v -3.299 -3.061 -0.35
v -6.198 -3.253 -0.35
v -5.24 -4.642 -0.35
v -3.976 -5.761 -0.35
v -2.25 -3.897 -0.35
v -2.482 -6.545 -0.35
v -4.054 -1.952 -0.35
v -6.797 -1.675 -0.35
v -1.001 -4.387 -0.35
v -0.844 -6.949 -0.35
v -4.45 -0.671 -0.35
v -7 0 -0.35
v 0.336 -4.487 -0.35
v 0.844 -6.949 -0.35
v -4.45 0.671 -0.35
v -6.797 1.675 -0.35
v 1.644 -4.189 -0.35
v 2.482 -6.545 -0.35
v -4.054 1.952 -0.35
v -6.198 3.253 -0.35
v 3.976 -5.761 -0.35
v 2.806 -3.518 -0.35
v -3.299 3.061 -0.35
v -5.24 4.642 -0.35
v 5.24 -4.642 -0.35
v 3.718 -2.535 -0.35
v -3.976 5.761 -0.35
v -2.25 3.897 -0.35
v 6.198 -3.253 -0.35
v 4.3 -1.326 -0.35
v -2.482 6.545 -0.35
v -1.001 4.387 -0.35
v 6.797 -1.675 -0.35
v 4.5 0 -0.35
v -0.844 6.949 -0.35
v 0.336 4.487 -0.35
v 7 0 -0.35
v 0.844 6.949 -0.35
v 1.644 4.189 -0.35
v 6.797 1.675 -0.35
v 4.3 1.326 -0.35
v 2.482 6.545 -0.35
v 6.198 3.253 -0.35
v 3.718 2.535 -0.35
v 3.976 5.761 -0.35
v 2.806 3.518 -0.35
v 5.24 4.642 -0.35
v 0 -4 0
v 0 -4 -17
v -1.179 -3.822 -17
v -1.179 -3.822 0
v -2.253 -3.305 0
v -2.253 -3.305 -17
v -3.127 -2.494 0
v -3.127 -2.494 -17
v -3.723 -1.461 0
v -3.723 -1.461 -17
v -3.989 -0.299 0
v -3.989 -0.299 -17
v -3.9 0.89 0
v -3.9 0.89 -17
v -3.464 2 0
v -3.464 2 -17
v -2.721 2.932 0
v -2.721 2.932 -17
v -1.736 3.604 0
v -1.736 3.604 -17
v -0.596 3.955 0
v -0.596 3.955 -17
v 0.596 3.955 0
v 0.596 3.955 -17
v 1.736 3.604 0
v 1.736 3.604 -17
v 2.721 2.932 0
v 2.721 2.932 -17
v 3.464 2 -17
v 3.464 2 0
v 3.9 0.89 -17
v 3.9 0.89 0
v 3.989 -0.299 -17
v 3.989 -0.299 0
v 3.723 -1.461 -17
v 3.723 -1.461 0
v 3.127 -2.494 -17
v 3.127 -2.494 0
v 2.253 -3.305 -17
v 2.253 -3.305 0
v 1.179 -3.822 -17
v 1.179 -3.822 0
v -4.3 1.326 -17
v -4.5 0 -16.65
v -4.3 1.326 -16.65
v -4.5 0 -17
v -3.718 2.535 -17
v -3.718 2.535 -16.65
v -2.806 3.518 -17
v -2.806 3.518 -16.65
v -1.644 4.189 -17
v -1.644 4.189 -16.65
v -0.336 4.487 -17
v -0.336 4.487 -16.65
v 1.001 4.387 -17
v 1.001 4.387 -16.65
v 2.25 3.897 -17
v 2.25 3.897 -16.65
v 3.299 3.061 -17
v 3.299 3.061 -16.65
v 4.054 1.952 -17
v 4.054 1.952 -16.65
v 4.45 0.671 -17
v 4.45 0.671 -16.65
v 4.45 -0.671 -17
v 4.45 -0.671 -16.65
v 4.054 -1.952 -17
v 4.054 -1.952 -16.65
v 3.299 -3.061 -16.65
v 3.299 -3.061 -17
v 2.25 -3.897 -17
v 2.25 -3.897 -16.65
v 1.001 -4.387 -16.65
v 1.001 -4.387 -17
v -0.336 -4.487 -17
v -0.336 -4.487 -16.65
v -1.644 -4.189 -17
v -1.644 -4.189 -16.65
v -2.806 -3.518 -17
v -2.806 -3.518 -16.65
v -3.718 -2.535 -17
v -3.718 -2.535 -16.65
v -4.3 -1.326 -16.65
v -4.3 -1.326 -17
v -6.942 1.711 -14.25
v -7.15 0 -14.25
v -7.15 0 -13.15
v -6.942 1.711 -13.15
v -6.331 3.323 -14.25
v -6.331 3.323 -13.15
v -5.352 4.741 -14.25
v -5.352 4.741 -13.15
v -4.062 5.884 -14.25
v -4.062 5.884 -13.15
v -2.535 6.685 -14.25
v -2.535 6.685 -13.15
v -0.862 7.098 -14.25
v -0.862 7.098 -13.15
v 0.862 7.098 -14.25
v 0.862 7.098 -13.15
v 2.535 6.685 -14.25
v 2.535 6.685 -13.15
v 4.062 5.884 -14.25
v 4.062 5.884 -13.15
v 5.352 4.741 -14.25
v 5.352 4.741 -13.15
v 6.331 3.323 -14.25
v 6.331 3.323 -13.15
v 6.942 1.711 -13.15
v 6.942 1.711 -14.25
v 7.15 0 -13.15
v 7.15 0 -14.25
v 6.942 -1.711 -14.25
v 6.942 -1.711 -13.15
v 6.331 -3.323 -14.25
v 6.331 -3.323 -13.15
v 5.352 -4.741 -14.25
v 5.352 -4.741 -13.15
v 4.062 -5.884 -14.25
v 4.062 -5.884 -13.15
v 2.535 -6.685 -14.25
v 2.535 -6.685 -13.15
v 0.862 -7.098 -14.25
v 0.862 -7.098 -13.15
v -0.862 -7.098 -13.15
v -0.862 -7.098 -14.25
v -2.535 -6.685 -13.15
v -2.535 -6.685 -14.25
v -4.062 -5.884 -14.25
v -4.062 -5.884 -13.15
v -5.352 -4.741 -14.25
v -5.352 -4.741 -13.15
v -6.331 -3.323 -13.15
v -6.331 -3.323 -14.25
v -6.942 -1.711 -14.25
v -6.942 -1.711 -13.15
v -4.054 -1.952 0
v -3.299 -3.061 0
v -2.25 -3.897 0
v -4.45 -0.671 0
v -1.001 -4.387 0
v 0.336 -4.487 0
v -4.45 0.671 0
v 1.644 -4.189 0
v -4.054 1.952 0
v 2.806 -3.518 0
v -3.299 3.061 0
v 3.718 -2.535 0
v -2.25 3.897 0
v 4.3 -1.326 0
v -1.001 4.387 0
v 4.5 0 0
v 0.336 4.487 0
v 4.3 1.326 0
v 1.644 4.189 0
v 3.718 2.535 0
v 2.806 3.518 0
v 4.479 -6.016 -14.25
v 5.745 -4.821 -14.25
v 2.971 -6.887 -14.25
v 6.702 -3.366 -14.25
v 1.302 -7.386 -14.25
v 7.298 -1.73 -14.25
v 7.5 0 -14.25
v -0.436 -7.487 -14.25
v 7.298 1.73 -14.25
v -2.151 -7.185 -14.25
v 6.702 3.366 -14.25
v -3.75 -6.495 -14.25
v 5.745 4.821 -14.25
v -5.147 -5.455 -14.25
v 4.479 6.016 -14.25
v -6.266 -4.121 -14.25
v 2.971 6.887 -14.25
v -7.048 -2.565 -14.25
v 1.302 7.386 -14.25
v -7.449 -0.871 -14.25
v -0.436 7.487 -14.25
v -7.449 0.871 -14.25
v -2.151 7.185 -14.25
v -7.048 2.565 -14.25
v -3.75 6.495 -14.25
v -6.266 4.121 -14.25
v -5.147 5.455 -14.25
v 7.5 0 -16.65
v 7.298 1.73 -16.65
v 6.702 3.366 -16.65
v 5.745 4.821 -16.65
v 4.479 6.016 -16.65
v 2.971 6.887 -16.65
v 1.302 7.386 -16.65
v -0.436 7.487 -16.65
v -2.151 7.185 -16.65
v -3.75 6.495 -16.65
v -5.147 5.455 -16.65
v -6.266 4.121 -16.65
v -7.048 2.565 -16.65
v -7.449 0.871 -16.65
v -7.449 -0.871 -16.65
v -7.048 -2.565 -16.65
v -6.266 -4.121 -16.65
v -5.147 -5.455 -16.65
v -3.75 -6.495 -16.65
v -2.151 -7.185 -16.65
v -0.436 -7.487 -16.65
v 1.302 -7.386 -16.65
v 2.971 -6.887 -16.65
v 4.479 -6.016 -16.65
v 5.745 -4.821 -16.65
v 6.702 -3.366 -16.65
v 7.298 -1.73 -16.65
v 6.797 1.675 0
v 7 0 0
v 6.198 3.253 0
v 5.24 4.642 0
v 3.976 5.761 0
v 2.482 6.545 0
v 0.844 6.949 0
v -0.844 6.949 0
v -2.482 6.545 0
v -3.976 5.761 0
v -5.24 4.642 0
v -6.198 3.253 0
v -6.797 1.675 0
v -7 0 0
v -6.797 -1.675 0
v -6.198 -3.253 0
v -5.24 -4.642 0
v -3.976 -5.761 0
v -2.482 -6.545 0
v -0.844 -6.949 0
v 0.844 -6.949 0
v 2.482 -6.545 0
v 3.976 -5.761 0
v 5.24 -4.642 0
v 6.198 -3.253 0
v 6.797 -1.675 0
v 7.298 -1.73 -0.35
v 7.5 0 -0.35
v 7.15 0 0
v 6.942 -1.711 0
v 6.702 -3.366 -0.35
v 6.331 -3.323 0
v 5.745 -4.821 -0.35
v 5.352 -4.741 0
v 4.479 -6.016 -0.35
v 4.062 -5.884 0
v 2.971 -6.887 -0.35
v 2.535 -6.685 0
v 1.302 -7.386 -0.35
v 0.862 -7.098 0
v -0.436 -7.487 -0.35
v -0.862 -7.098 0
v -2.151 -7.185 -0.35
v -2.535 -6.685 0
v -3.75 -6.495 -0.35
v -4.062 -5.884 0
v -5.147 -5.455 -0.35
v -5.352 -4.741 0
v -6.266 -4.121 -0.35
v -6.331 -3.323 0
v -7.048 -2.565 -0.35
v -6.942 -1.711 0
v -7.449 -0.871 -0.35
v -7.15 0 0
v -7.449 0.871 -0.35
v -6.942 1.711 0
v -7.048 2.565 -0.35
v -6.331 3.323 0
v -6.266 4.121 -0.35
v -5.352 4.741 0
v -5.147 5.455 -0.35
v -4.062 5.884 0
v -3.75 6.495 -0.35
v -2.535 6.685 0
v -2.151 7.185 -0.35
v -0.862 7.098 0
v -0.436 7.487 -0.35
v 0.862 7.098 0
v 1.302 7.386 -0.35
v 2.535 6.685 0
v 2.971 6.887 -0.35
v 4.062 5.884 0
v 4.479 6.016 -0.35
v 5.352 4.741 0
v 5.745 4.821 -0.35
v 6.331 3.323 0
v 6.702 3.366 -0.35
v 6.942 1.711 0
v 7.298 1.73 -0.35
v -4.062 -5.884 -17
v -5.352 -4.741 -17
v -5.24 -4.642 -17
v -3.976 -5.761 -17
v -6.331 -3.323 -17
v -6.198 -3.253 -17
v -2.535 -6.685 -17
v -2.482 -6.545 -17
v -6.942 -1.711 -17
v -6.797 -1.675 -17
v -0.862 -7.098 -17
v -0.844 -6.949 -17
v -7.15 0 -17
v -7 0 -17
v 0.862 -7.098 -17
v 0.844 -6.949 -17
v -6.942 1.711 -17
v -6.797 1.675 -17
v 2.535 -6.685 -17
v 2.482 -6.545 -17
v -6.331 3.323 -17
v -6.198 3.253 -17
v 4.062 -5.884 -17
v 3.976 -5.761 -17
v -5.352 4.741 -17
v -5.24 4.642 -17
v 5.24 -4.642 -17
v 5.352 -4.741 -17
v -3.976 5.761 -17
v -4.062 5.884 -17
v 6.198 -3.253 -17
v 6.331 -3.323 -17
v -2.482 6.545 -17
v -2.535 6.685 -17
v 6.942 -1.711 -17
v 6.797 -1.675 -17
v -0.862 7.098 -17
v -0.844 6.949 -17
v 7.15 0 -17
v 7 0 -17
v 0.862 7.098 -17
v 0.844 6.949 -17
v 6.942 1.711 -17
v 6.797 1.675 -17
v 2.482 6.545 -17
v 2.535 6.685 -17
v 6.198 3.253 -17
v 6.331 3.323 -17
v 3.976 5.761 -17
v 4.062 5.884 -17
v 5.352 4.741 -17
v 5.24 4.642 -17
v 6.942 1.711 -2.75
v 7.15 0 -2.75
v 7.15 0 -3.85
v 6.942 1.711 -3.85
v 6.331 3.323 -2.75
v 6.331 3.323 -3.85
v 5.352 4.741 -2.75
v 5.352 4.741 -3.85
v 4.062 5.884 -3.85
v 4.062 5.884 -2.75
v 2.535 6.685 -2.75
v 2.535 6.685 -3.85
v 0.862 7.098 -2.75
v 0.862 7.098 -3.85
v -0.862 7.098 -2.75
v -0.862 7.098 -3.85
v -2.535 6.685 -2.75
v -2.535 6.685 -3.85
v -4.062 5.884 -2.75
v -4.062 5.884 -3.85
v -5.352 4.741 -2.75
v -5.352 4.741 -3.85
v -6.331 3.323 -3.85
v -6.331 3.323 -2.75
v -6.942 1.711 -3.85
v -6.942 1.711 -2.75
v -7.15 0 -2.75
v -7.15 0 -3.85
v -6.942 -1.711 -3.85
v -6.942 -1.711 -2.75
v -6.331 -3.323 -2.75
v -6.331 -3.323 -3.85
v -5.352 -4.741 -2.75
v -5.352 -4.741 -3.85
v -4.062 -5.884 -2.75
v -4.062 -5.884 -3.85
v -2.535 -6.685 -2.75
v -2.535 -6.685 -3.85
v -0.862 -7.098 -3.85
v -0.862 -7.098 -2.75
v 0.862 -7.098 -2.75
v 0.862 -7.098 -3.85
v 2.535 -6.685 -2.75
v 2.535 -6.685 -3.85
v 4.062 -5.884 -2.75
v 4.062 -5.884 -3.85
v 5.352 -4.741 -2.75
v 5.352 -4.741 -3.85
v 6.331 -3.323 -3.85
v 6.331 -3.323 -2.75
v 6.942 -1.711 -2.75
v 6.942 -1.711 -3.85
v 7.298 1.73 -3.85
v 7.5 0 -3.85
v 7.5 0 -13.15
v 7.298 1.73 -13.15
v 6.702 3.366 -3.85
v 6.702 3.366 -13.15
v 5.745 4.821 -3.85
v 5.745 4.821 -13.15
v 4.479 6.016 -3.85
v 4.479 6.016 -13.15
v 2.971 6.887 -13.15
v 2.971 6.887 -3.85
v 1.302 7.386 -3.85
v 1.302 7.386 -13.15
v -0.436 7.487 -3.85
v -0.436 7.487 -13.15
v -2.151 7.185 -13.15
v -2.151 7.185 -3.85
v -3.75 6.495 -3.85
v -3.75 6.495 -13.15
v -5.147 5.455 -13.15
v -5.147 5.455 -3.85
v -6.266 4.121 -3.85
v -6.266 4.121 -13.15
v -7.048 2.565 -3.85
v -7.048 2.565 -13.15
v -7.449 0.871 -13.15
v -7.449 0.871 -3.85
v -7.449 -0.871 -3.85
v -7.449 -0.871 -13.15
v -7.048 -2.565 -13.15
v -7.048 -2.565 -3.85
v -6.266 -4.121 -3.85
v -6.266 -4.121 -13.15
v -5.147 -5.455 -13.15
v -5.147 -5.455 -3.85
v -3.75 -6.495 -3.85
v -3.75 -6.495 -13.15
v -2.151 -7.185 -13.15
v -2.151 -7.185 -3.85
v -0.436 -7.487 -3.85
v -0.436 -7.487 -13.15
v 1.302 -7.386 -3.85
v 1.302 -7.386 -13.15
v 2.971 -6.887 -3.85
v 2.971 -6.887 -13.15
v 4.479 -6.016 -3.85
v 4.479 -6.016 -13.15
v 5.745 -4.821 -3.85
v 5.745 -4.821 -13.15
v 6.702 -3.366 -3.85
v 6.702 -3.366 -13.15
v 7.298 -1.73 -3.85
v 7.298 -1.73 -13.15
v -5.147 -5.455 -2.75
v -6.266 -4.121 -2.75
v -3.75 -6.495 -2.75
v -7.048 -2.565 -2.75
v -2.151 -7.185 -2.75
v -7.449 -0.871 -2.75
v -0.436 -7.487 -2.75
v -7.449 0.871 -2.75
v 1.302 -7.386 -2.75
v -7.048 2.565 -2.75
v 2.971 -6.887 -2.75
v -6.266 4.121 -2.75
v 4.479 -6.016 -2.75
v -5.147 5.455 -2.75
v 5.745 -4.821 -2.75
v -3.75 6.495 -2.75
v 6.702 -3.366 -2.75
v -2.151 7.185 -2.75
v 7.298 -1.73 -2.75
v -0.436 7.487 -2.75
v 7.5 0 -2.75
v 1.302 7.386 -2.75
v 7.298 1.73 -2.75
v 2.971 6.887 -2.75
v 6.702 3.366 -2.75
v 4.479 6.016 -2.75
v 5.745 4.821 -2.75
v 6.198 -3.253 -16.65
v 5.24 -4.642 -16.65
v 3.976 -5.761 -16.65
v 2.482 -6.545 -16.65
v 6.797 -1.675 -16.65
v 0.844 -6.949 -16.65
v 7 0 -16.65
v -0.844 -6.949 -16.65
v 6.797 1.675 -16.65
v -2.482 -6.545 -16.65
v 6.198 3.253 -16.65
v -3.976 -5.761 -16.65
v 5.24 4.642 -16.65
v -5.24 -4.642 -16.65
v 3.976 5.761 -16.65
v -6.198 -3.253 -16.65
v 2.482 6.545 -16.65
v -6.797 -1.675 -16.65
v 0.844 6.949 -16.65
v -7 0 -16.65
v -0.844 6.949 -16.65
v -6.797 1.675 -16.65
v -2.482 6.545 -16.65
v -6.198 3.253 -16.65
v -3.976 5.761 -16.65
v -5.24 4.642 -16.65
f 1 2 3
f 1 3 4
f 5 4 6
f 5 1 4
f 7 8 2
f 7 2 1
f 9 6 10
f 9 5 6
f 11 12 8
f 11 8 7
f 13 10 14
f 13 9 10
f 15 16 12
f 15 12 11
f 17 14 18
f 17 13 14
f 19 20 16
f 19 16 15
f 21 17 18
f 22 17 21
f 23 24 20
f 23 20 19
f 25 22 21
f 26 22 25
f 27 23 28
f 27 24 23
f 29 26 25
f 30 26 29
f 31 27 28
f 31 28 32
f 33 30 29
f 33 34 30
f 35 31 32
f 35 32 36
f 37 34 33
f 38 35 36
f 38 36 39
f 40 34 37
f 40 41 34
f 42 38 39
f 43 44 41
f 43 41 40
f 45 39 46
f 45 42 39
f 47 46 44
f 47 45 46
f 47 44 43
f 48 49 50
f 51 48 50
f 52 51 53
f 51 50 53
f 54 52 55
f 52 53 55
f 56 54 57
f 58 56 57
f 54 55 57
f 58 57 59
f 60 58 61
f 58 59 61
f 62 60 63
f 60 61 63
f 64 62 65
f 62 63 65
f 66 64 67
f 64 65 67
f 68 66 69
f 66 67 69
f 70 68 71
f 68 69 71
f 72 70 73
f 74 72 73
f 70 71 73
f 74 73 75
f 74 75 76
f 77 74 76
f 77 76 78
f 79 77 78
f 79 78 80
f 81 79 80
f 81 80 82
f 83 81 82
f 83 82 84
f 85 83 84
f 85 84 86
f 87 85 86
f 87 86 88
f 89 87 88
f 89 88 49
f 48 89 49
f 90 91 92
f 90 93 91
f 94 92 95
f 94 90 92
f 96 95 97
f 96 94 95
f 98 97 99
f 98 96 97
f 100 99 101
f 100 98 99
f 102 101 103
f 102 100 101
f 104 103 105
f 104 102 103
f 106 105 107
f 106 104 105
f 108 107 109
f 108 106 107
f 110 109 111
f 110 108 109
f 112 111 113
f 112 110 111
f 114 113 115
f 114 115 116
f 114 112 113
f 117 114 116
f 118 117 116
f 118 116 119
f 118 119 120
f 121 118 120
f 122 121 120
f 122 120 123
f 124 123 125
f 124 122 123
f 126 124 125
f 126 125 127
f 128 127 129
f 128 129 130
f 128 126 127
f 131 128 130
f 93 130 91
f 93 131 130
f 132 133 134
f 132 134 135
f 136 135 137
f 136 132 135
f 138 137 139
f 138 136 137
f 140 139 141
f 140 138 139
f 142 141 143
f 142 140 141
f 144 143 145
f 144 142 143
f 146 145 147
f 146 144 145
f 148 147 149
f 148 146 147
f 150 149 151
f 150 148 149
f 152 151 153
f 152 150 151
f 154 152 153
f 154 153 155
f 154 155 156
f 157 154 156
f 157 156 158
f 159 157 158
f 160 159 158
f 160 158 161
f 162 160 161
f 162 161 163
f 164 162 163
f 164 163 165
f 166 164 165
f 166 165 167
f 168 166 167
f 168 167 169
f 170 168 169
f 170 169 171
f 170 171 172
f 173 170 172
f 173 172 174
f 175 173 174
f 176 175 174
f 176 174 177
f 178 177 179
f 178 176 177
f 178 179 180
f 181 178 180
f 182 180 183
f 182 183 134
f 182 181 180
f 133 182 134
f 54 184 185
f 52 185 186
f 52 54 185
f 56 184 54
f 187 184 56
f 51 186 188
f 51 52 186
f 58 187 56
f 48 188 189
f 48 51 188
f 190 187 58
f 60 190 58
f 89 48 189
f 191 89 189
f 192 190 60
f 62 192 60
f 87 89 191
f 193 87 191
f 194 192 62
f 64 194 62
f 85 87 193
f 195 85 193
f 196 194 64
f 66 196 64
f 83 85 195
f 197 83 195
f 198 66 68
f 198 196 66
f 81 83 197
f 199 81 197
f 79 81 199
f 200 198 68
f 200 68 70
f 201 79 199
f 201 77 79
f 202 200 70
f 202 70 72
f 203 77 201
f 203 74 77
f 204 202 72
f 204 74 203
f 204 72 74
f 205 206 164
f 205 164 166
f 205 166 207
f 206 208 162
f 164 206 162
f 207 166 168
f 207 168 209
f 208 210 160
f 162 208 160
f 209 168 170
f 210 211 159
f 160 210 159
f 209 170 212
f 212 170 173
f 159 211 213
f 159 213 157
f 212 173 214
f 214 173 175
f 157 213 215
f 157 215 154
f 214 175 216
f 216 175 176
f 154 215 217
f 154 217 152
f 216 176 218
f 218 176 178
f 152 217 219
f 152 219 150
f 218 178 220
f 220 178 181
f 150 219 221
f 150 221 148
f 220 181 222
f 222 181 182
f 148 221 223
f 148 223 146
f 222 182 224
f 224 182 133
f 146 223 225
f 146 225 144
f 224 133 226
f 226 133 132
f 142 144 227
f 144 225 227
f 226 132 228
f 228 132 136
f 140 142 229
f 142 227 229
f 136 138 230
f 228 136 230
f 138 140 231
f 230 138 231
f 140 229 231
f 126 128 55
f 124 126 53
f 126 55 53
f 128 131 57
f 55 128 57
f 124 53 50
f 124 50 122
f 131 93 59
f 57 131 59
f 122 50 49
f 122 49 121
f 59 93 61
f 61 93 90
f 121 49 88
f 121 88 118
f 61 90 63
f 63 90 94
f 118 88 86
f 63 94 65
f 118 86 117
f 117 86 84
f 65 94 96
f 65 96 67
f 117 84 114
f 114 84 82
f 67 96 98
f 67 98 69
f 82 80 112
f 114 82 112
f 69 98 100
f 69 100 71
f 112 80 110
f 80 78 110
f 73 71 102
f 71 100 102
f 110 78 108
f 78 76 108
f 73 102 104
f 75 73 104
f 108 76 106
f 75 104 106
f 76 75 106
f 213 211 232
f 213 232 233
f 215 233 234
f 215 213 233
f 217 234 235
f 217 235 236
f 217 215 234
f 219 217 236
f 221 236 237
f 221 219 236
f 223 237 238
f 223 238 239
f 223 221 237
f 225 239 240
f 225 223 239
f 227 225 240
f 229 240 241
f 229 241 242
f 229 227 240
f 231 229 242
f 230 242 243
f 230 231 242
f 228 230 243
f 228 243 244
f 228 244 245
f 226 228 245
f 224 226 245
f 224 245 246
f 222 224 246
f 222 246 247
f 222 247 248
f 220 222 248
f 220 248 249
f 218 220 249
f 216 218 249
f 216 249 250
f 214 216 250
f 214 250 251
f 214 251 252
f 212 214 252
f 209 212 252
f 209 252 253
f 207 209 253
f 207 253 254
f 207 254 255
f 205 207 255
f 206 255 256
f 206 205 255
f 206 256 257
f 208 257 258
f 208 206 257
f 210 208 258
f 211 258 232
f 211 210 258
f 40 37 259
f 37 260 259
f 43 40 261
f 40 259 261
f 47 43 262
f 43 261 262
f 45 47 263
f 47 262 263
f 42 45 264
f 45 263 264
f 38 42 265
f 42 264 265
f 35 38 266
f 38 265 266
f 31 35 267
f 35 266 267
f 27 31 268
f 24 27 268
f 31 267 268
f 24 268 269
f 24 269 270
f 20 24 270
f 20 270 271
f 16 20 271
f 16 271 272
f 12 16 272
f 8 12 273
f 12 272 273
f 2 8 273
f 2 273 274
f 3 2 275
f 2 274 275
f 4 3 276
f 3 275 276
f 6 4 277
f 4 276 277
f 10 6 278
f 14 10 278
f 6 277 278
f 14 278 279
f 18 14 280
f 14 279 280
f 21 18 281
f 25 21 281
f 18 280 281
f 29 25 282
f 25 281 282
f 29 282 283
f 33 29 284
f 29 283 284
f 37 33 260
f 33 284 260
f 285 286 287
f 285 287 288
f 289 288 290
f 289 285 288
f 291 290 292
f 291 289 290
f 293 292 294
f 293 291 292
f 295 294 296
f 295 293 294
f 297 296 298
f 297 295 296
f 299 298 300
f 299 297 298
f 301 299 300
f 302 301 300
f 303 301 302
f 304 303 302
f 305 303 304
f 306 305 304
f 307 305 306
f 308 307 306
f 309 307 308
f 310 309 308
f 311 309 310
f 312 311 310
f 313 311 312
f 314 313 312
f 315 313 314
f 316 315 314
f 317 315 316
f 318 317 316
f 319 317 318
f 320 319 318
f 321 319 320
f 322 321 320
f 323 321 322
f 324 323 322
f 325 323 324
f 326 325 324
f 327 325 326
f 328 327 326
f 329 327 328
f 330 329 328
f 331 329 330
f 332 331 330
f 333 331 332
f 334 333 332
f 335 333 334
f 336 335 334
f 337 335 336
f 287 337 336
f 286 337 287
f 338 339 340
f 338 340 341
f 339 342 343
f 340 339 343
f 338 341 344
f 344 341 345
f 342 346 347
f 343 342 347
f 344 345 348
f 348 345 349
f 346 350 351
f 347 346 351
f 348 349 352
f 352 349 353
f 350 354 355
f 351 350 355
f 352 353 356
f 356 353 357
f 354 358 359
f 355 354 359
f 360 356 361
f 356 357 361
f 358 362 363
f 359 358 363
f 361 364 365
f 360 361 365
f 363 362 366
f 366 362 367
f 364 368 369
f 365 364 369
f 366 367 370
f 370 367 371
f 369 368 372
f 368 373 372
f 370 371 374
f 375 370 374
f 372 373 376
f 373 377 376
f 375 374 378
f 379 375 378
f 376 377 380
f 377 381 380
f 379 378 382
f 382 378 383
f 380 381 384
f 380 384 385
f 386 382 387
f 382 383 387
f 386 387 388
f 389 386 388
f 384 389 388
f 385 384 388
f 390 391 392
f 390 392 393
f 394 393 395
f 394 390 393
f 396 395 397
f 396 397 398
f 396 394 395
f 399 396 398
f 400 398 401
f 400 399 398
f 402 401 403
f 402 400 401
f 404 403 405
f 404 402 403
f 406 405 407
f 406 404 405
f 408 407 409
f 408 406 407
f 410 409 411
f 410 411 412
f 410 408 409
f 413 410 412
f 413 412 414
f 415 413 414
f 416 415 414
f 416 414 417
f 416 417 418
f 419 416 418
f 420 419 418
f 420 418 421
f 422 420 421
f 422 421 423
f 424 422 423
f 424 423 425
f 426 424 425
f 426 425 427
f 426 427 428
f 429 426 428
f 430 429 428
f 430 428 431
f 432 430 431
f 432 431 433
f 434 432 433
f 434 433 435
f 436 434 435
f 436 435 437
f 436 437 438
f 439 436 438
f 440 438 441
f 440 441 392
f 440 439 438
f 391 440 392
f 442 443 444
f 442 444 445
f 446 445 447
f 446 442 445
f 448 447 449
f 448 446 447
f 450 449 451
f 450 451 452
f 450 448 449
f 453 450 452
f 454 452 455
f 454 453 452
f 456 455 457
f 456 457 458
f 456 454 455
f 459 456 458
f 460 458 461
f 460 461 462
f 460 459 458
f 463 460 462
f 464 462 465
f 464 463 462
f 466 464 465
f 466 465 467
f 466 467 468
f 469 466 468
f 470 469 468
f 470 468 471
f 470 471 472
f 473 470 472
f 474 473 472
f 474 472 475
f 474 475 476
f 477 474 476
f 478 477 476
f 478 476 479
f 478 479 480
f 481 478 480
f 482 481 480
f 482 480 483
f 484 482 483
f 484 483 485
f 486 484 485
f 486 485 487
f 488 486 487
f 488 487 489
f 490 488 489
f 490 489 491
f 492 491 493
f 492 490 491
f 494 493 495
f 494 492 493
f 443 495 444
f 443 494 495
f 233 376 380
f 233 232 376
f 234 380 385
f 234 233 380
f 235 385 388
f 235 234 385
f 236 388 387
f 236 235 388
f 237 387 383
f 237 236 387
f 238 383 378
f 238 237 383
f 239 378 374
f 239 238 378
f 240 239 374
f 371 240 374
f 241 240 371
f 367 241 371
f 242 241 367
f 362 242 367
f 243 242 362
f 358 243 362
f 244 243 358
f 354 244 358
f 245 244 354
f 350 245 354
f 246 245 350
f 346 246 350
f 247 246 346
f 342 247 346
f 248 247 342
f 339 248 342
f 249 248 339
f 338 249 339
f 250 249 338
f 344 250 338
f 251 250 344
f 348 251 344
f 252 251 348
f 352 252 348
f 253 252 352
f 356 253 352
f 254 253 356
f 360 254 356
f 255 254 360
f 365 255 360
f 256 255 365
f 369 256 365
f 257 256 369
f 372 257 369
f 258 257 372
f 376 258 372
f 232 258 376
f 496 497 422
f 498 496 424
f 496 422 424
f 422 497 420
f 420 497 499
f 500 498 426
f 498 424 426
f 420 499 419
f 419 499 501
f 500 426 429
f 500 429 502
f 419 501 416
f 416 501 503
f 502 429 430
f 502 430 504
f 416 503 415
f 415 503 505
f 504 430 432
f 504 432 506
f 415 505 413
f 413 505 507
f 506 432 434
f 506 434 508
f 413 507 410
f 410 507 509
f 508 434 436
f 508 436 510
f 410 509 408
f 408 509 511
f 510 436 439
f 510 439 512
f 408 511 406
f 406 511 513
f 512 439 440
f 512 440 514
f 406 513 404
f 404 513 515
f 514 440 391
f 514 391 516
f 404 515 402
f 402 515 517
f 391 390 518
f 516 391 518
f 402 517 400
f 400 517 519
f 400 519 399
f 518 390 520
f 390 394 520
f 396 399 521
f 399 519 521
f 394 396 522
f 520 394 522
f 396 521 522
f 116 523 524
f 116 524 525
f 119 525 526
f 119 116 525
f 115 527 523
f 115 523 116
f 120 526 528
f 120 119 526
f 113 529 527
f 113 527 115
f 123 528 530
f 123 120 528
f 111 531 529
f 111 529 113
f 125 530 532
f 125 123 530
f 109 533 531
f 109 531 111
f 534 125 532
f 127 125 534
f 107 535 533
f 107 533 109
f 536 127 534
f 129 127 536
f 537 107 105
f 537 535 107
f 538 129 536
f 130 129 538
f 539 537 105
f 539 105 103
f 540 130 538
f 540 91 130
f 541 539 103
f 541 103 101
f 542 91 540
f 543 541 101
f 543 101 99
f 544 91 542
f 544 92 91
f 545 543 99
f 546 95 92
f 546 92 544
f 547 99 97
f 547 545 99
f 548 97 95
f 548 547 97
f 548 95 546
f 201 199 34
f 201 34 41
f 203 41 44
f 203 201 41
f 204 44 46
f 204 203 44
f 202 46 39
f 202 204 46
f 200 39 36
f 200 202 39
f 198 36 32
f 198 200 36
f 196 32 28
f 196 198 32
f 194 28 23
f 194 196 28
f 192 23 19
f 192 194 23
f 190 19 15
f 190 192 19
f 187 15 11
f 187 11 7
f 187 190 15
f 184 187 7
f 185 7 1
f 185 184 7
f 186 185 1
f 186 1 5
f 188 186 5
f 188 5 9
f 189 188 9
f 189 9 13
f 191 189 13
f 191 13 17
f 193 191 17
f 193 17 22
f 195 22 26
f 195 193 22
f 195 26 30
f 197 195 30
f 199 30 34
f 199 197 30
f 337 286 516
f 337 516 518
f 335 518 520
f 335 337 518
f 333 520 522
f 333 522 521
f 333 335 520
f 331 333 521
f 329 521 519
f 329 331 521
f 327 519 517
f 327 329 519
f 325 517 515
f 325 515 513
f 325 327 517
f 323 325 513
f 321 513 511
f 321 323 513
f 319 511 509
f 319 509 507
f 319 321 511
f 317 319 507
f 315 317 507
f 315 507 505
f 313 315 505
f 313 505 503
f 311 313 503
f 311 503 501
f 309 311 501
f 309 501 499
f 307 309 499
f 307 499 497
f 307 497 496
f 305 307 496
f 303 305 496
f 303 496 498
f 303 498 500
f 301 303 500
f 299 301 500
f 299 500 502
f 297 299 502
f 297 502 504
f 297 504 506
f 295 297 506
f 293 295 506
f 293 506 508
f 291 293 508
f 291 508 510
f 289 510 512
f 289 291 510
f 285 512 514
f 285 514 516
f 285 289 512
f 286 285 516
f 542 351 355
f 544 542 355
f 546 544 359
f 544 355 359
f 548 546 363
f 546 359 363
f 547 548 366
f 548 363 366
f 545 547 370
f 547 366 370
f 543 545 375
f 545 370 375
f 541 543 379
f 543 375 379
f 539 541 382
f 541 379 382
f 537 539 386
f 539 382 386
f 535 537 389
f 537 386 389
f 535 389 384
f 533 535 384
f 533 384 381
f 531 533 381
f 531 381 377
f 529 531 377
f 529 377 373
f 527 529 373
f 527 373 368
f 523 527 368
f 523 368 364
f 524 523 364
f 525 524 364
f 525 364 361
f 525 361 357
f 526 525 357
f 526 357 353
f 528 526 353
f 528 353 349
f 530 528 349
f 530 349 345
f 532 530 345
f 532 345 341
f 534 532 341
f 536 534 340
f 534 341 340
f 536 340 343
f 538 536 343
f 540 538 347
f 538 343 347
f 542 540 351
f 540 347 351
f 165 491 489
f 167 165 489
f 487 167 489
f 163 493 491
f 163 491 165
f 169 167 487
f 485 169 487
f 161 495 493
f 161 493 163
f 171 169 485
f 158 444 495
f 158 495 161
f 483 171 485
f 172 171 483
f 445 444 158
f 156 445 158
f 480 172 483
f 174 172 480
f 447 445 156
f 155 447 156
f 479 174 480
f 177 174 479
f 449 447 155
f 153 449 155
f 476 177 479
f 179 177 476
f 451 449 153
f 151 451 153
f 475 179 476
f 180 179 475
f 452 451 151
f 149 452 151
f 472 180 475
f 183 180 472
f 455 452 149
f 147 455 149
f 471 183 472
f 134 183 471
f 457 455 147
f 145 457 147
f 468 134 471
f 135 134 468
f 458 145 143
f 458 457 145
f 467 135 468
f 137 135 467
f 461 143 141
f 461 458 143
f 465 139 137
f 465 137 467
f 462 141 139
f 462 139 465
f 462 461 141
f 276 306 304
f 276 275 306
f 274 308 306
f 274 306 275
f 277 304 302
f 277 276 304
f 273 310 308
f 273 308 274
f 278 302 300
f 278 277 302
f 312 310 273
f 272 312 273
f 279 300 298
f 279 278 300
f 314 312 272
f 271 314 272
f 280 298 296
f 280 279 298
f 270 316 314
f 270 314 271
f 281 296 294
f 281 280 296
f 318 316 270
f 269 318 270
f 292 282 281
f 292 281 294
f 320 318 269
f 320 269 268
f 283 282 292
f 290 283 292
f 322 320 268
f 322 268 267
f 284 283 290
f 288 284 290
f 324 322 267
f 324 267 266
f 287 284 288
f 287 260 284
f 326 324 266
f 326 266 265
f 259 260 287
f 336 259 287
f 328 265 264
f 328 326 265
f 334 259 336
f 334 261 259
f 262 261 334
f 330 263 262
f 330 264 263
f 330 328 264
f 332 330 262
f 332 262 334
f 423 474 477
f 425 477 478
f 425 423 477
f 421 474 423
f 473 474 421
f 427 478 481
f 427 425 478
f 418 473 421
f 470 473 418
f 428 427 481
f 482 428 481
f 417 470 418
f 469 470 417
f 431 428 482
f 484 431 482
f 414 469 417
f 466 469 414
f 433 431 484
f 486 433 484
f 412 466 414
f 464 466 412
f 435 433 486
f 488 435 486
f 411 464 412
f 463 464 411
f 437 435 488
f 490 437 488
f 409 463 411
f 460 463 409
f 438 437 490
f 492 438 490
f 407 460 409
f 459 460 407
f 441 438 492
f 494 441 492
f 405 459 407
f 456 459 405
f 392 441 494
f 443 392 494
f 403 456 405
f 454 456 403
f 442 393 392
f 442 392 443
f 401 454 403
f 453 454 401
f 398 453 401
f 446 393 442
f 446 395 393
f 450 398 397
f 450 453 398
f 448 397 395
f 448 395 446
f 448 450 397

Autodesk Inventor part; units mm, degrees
ref_plane "YZ Plane" through (0, 0, 0) normal (1, 0, 0) x (0, 1, 0)
sketch "Эскиз6" plane through (0, 0, 0) normal (0, 0, 1) x (1, 0, 0)
  circle A0 centre (0, 0) radius 7.5
  dimension "d27" = 15
extrude "Выдавливание2" add sketch "Эскиз6" against normal blind 17
sketch "Эскиз8" plane through (0, 0, 0) normal (0, 0, 1) x (1, 0, 0)
  point P0 (0, 0)
  point P1 (0, 0)
hole "Отверстие1" at (0, 0, 0) direction (0, 0, -1) diameter 8 end through all
ref_plane "РабПлоскость1" through (0, 0, -2.75) normal (0, 0, 1) x (1, 0, 0)
ref_plane "РабПлоскость2" through (0, 0, -14.25) normal (0, 0, -1) x (-1, 0, 0)
sketch "Эскиз10" plane through (0, 0, -14.25) normal (0, 0, -1) x (-1, 0, 0)
  circle A0 centre (0, 0) radius 7.15
  circle A1 centre (0, 0) radius 7.5
  dimension "d40" = 14.3
  dimension "d41" = 15
sketch "Эскиз11" plane through (0, 0, -2.75) normal (0, 0, 1) x (1, 0, 0)
  circle A0 centre (0, 0) radius 7.15
  circle A1 centre (0, 0) radius 7.5
  dimension "d42" = 14.3
  dimension "d43" = 15
extrude "Выдавливание3" cut sketch "Эскиз11" against normal blind 1.1
extrude "Выдавливание4" cut sketch "Эскиз10" against normal blind 1.1
sketch "Эскиз12" plane through (0, 0, -17) normal (0, 0, -1) x (-1, 0, 0)
  circle A0 centre (0, 0) radius 7
  circle A1 centre (0, 0) radius 4.5
  dimension "d48" = 14
  dimension "d49" = 9
extrude "Выдавливание5" cut sketch "Эскиз12" against normal blind 0.35
sketch "Эскиз13" plane through (0, 0, 0) normal (0, 0, 1) x (1, 0, 0)
  circle A0 centre (0, 0) radius 4.5
  circle A1 centre (0, 0) radius 7
  dimension "d52" = 9
  dimension "d53" = 14
extrude "Выдавливание6" cut sketch "Эскиз13" against normal blind 0.35
chamfer "Фаска1" distance 0.35 angle 45 2 edges at (-7.5, 0, 0) (-7.5, 0, -17)
properties part number "LM8"
